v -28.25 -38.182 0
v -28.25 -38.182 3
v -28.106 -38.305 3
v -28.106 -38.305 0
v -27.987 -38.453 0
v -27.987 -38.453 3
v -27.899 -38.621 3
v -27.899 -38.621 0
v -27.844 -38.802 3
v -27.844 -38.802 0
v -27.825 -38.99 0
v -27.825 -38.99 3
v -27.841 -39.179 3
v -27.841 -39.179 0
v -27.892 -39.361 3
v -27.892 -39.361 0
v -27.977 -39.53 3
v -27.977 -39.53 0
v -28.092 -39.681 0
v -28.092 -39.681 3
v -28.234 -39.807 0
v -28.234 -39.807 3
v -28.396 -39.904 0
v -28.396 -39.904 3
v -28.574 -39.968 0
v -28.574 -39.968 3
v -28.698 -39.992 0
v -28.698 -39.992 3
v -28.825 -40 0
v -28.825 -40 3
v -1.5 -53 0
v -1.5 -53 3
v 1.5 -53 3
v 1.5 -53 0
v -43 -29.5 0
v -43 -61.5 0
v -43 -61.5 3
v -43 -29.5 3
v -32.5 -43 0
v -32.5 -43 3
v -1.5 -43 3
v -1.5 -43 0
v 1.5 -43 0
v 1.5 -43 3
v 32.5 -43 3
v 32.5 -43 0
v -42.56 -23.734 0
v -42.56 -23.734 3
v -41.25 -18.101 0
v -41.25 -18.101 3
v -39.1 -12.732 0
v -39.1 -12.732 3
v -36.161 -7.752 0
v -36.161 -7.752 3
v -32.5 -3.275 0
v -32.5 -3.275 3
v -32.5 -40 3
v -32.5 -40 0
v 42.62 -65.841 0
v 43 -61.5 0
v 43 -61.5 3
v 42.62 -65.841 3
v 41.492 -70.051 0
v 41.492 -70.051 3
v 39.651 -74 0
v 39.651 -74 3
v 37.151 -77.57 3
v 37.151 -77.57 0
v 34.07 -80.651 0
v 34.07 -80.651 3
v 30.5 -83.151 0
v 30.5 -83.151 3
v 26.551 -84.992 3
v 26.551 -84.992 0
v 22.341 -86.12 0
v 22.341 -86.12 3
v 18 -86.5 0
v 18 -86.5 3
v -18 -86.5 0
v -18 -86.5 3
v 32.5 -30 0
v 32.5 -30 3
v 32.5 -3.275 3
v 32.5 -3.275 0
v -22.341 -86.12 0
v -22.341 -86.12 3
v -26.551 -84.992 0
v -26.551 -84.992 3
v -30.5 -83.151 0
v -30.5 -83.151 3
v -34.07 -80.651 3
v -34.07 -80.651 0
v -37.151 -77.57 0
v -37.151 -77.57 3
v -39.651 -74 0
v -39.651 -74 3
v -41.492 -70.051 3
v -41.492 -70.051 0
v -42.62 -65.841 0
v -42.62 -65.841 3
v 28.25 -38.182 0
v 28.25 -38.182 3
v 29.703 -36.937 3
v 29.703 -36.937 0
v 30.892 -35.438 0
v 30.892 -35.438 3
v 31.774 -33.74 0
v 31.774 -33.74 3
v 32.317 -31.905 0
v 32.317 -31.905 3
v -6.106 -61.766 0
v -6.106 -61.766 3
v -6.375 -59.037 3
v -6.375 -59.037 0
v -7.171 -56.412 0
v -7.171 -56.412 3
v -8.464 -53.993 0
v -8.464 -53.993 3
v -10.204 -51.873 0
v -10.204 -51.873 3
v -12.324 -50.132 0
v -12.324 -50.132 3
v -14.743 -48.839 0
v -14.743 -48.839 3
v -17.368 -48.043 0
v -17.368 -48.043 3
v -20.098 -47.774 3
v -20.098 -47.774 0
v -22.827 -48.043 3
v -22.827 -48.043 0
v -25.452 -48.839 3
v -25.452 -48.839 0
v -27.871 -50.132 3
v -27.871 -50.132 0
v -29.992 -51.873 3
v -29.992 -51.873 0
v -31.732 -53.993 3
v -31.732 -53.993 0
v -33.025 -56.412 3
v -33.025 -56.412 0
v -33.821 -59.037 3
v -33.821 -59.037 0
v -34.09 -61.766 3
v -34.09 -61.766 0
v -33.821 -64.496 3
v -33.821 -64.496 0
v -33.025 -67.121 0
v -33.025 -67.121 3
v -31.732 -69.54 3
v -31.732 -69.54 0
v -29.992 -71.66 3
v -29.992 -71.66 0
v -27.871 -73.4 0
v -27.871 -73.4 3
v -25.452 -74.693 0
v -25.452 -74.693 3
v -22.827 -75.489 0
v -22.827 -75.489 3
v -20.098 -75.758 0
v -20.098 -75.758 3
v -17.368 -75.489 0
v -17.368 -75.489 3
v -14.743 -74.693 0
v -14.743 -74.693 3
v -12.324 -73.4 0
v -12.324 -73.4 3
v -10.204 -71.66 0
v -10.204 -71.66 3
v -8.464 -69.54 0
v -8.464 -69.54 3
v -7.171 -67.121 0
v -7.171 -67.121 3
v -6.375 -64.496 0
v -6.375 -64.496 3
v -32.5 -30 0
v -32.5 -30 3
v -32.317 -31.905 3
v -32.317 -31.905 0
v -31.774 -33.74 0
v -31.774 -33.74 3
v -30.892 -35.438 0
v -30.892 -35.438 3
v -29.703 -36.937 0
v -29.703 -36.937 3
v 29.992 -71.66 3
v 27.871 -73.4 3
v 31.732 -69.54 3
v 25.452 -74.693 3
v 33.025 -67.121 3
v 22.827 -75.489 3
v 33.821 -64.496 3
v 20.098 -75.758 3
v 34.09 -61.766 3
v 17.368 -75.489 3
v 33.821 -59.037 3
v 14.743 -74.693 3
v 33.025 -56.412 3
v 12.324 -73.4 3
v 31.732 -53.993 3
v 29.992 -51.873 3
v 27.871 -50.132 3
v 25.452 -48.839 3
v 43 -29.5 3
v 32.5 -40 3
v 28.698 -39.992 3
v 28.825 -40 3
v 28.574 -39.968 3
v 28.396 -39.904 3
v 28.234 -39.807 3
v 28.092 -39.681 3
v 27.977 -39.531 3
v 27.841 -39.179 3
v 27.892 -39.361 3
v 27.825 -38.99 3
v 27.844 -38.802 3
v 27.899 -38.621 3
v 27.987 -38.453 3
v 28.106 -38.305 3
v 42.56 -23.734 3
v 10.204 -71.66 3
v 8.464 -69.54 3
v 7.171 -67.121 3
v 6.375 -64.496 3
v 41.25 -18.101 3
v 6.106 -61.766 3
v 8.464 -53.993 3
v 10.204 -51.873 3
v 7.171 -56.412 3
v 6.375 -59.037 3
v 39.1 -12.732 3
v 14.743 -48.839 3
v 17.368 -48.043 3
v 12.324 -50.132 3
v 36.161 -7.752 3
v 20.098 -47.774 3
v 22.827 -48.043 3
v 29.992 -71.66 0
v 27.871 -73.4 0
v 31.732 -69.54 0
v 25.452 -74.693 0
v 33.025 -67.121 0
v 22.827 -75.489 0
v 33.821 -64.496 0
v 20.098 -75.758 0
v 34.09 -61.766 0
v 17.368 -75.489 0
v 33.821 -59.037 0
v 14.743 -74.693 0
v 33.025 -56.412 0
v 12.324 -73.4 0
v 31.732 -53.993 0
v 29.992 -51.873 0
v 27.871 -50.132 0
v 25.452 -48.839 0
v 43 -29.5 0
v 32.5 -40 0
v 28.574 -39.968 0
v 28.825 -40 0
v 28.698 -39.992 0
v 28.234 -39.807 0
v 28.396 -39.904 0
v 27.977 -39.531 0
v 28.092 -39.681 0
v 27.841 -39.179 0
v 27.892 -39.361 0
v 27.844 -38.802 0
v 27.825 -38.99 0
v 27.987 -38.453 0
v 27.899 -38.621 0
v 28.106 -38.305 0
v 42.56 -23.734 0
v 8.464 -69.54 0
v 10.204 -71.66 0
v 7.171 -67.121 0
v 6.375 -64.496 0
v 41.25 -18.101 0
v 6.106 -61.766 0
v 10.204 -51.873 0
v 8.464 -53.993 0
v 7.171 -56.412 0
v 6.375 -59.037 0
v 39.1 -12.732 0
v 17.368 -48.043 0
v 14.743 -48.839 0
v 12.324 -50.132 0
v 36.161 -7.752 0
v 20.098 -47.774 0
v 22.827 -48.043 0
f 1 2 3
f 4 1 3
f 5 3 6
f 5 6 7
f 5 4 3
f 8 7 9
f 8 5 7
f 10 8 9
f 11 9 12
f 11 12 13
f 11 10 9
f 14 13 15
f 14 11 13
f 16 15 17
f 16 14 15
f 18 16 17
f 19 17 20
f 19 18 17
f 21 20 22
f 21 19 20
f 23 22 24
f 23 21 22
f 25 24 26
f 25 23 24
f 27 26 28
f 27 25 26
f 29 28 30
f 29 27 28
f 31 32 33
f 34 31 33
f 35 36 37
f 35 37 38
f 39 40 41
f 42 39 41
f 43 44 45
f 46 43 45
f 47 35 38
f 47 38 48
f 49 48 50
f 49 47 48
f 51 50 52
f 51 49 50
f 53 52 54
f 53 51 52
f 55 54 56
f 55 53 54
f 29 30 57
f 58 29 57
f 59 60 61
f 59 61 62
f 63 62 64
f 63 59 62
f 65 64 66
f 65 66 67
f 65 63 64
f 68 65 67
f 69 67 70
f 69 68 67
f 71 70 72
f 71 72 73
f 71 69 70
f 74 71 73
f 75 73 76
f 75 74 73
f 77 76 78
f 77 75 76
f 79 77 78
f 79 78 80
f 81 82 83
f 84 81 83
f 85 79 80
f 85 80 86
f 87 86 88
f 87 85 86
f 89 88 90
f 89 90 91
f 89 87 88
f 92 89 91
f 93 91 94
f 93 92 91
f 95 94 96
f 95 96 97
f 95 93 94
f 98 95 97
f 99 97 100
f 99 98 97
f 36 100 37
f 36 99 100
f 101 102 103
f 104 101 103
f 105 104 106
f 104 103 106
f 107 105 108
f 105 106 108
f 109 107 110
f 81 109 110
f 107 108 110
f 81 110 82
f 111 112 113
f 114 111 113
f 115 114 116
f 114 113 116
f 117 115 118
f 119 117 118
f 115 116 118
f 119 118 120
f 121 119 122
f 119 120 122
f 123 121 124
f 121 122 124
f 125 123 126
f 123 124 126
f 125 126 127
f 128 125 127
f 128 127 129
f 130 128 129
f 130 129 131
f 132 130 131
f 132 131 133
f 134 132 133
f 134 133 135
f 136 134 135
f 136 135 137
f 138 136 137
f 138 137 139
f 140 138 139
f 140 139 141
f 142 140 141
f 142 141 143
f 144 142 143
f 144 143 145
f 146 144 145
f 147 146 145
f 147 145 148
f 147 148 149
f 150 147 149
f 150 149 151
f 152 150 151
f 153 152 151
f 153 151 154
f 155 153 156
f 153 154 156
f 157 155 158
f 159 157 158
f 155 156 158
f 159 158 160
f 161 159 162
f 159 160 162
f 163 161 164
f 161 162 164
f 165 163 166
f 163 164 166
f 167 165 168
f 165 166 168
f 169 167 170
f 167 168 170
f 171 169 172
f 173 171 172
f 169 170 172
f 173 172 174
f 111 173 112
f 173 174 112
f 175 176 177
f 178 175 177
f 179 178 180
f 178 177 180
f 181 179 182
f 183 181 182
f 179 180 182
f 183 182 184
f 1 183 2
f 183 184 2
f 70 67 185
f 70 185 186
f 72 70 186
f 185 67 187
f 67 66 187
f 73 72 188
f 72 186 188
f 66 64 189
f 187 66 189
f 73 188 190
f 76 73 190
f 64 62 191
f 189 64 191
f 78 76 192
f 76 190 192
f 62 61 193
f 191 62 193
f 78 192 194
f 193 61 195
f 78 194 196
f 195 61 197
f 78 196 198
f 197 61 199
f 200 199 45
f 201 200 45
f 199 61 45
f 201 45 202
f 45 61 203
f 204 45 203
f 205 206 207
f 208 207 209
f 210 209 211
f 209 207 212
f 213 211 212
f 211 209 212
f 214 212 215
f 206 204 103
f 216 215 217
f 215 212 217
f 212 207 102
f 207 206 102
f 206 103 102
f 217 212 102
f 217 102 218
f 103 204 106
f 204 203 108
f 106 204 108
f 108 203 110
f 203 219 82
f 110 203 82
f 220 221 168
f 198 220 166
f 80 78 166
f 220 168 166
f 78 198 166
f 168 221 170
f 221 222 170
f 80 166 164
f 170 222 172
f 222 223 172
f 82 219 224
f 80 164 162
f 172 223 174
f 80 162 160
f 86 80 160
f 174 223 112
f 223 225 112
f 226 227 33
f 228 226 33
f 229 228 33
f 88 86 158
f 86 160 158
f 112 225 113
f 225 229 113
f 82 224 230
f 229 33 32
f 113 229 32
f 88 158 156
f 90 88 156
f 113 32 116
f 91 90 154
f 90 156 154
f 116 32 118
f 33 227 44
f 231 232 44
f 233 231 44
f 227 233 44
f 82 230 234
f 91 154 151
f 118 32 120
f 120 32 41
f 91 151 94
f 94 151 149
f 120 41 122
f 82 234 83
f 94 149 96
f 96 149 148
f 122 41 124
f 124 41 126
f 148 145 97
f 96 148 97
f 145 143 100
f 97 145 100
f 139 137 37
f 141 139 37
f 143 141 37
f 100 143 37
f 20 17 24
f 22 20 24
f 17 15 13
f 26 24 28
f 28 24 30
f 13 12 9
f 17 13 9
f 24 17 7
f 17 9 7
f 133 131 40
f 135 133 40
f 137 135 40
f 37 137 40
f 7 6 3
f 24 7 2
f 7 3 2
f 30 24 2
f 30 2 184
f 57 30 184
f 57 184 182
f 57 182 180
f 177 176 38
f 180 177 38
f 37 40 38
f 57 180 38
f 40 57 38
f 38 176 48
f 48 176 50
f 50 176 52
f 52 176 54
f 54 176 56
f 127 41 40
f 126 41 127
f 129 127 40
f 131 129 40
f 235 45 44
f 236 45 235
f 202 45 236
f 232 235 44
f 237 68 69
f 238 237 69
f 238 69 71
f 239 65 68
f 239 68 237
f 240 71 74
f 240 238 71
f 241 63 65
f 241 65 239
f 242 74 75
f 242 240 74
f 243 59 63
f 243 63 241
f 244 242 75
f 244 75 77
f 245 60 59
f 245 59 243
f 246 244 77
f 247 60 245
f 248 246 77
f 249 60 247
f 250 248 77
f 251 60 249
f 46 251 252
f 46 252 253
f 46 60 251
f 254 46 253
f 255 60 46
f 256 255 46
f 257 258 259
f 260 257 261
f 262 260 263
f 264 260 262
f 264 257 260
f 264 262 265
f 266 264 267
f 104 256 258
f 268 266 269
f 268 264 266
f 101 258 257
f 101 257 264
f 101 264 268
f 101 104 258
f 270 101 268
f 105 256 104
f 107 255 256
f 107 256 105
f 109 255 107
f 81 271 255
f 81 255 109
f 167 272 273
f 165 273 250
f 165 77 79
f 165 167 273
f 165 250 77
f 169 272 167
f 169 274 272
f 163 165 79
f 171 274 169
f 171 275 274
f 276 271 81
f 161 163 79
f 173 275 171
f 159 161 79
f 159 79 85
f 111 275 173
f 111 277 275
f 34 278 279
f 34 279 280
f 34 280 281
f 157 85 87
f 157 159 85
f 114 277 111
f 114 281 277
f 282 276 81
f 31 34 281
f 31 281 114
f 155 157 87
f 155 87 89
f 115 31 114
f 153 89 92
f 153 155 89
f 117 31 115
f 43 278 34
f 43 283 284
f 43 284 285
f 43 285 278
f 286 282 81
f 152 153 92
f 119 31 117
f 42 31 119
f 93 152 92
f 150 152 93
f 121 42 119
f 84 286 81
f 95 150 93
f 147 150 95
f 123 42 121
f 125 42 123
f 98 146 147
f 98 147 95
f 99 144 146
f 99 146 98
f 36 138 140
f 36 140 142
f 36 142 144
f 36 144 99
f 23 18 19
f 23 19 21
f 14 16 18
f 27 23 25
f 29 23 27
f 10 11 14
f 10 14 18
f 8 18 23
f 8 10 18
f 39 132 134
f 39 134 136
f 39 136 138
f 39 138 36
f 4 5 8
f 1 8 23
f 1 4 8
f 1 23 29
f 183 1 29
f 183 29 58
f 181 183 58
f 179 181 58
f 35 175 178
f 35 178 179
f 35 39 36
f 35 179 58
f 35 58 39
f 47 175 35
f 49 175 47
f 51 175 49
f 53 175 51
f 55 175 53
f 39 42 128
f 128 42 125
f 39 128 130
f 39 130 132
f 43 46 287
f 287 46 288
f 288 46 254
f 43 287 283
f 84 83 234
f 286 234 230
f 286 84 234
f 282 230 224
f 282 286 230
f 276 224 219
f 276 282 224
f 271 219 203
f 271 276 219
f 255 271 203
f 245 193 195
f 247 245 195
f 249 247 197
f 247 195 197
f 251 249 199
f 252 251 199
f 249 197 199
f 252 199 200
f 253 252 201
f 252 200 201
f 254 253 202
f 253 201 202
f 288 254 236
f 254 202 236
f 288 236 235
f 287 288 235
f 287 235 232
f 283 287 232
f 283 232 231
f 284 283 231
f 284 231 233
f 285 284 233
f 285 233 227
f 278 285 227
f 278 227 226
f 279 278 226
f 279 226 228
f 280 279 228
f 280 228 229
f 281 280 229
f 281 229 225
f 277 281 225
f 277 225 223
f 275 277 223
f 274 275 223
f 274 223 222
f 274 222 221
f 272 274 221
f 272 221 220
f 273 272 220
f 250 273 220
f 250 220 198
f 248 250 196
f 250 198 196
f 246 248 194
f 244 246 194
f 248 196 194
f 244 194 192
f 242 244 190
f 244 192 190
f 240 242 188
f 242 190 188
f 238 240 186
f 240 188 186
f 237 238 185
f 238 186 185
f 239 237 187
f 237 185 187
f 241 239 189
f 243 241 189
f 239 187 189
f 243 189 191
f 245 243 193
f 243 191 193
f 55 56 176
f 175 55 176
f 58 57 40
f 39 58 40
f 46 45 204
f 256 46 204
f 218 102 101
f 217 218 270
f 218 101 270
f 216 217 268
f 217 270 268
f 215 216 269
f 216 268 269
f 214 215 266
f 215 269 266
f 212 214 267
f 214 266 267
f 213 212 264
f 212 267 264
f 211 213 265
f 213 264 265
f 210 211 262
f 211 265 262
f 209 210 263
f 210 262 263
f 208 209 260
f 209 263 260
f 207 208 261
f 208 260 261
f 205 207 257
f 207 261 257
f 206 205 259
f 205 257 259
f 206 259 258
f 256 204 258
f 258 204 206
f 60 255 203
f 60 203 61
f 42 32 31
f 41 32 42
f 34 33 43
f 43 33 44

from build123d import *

# Parameters (mm, degrees)
BOSS_EXTRUDE1_DEPTH = 3
CUT_EXTRUDE1_DEPTH  = 10
SKETCH3_W           = 3
SKETCH3_H           = 10
CUT_EXTRUDE2_DEPTH  = 10
SKETCH4_R           = 13.991897225
CUT_EXTRUDE3_DEPTH  = 10
FILLET1_R           = 1


with BuildPart() as part:
    # Sketch1 → Boss-Extrude1 (new body)
    with BuildSketch(Plane.XY):
        with BuildLine():
            Line((-5, 8.5), (5, 8.5))
            ThreePointArc((5, 8.5), (31.870057685, -2.629942315), (43, -29.5))
            Line((43, -29.5), (43, -61.5))
            ThreePointArc((43, -61.5), (35.67766953, -79.17766953), (18, -86.5))
            Line((18, -86.5), (0.5, -86.5))
            Line((0.5, -86.5), (-0.5, -86.5))
            Line((-0.5, -86.5), (-18, -86.5))
            ThreePointArc((-18, -86.5), (-35.67766953, -79.17766953), (-43, -61.5))
            Line((-43, -61.5), (-43, -29.5))
            ThreePointArc((-43, -29.5), (-31.870057685, -2.629942315), (-5, 8.5))
        make_face()
    extrude(amount=BOSS_EXTRUDE1_DEPTH)

    # Sketch2 → Cut-Extrude1 (cut)
    with BuildSketch(Plane.XY.offset(3)):
        with BuildLine():
            Line((-22.5, -40), (22.5, -40))
            ThreePointArc((22.5, -40), (29.571067812, -37.071067812), (32.5, -30))
            Line((32.5, -30), (32.5, 20))
            ThreePointArc((32.5, 20), (29.571067812, 27.071067812), (22.5, 30))
            Line((22.5, 30), (-22.5, 30))
            ThreePointArc((-22.5, 30), (-29.571067812, 27.071067812), (-32.5, 20))
            Line((-32.5, 20), (-32.5, -30))
            ThreePointArc((-32.5, -30), (-29.571067812, -37.071067812), (-22.5, -40))
        make_face()
    extrude(amount=-CUT_EXTRUDE1_DEPTH, mode=Mode.SUBTRACT)

    # Sketch3 → Cut-Extrude2 (cut)
    with BuildSketch(Plane.XY.offset(3)):
        Polygon((-32.5, -40), (-32.5, -43), (-1.5, -43), (1.5, -43), (32.5, -43), (32.5, -40), (22.5, -40), (-22.5, -40), align=None)
        with Locations((0, -48)):
            Rectangle(SKETCH3_W, SKETCH3_H)
    extrude(amount=-CUT_EXTRUDE2_DEPTH, mode=Mode.SUBTRACT)

    # Sketch4 → Cut-Extrude3 (cut)
    with BuildSketch(Plane.XY.offset(3)):
        with Locations((-20.09774362, -61.766309122)):
            Circle(SKETCH4_R)
        with Locations((20.09774362, -61.766309122)):
            Circle(SKETCH4_R)
    extrude(amount=-CUT_EXTRUDE3_DEPTH, mode=Mode.SUBTRACT)

    # Fillet1
    fillet1_edges = [part.edges().sort_by_distance(p)[0] for p in [
        (22.5, -40, 1.5),
        (-22.5, -40, 1.5),
    ]]
    fillet(fillet1_edges, radius=FILLET1_R)


solid = part.part
